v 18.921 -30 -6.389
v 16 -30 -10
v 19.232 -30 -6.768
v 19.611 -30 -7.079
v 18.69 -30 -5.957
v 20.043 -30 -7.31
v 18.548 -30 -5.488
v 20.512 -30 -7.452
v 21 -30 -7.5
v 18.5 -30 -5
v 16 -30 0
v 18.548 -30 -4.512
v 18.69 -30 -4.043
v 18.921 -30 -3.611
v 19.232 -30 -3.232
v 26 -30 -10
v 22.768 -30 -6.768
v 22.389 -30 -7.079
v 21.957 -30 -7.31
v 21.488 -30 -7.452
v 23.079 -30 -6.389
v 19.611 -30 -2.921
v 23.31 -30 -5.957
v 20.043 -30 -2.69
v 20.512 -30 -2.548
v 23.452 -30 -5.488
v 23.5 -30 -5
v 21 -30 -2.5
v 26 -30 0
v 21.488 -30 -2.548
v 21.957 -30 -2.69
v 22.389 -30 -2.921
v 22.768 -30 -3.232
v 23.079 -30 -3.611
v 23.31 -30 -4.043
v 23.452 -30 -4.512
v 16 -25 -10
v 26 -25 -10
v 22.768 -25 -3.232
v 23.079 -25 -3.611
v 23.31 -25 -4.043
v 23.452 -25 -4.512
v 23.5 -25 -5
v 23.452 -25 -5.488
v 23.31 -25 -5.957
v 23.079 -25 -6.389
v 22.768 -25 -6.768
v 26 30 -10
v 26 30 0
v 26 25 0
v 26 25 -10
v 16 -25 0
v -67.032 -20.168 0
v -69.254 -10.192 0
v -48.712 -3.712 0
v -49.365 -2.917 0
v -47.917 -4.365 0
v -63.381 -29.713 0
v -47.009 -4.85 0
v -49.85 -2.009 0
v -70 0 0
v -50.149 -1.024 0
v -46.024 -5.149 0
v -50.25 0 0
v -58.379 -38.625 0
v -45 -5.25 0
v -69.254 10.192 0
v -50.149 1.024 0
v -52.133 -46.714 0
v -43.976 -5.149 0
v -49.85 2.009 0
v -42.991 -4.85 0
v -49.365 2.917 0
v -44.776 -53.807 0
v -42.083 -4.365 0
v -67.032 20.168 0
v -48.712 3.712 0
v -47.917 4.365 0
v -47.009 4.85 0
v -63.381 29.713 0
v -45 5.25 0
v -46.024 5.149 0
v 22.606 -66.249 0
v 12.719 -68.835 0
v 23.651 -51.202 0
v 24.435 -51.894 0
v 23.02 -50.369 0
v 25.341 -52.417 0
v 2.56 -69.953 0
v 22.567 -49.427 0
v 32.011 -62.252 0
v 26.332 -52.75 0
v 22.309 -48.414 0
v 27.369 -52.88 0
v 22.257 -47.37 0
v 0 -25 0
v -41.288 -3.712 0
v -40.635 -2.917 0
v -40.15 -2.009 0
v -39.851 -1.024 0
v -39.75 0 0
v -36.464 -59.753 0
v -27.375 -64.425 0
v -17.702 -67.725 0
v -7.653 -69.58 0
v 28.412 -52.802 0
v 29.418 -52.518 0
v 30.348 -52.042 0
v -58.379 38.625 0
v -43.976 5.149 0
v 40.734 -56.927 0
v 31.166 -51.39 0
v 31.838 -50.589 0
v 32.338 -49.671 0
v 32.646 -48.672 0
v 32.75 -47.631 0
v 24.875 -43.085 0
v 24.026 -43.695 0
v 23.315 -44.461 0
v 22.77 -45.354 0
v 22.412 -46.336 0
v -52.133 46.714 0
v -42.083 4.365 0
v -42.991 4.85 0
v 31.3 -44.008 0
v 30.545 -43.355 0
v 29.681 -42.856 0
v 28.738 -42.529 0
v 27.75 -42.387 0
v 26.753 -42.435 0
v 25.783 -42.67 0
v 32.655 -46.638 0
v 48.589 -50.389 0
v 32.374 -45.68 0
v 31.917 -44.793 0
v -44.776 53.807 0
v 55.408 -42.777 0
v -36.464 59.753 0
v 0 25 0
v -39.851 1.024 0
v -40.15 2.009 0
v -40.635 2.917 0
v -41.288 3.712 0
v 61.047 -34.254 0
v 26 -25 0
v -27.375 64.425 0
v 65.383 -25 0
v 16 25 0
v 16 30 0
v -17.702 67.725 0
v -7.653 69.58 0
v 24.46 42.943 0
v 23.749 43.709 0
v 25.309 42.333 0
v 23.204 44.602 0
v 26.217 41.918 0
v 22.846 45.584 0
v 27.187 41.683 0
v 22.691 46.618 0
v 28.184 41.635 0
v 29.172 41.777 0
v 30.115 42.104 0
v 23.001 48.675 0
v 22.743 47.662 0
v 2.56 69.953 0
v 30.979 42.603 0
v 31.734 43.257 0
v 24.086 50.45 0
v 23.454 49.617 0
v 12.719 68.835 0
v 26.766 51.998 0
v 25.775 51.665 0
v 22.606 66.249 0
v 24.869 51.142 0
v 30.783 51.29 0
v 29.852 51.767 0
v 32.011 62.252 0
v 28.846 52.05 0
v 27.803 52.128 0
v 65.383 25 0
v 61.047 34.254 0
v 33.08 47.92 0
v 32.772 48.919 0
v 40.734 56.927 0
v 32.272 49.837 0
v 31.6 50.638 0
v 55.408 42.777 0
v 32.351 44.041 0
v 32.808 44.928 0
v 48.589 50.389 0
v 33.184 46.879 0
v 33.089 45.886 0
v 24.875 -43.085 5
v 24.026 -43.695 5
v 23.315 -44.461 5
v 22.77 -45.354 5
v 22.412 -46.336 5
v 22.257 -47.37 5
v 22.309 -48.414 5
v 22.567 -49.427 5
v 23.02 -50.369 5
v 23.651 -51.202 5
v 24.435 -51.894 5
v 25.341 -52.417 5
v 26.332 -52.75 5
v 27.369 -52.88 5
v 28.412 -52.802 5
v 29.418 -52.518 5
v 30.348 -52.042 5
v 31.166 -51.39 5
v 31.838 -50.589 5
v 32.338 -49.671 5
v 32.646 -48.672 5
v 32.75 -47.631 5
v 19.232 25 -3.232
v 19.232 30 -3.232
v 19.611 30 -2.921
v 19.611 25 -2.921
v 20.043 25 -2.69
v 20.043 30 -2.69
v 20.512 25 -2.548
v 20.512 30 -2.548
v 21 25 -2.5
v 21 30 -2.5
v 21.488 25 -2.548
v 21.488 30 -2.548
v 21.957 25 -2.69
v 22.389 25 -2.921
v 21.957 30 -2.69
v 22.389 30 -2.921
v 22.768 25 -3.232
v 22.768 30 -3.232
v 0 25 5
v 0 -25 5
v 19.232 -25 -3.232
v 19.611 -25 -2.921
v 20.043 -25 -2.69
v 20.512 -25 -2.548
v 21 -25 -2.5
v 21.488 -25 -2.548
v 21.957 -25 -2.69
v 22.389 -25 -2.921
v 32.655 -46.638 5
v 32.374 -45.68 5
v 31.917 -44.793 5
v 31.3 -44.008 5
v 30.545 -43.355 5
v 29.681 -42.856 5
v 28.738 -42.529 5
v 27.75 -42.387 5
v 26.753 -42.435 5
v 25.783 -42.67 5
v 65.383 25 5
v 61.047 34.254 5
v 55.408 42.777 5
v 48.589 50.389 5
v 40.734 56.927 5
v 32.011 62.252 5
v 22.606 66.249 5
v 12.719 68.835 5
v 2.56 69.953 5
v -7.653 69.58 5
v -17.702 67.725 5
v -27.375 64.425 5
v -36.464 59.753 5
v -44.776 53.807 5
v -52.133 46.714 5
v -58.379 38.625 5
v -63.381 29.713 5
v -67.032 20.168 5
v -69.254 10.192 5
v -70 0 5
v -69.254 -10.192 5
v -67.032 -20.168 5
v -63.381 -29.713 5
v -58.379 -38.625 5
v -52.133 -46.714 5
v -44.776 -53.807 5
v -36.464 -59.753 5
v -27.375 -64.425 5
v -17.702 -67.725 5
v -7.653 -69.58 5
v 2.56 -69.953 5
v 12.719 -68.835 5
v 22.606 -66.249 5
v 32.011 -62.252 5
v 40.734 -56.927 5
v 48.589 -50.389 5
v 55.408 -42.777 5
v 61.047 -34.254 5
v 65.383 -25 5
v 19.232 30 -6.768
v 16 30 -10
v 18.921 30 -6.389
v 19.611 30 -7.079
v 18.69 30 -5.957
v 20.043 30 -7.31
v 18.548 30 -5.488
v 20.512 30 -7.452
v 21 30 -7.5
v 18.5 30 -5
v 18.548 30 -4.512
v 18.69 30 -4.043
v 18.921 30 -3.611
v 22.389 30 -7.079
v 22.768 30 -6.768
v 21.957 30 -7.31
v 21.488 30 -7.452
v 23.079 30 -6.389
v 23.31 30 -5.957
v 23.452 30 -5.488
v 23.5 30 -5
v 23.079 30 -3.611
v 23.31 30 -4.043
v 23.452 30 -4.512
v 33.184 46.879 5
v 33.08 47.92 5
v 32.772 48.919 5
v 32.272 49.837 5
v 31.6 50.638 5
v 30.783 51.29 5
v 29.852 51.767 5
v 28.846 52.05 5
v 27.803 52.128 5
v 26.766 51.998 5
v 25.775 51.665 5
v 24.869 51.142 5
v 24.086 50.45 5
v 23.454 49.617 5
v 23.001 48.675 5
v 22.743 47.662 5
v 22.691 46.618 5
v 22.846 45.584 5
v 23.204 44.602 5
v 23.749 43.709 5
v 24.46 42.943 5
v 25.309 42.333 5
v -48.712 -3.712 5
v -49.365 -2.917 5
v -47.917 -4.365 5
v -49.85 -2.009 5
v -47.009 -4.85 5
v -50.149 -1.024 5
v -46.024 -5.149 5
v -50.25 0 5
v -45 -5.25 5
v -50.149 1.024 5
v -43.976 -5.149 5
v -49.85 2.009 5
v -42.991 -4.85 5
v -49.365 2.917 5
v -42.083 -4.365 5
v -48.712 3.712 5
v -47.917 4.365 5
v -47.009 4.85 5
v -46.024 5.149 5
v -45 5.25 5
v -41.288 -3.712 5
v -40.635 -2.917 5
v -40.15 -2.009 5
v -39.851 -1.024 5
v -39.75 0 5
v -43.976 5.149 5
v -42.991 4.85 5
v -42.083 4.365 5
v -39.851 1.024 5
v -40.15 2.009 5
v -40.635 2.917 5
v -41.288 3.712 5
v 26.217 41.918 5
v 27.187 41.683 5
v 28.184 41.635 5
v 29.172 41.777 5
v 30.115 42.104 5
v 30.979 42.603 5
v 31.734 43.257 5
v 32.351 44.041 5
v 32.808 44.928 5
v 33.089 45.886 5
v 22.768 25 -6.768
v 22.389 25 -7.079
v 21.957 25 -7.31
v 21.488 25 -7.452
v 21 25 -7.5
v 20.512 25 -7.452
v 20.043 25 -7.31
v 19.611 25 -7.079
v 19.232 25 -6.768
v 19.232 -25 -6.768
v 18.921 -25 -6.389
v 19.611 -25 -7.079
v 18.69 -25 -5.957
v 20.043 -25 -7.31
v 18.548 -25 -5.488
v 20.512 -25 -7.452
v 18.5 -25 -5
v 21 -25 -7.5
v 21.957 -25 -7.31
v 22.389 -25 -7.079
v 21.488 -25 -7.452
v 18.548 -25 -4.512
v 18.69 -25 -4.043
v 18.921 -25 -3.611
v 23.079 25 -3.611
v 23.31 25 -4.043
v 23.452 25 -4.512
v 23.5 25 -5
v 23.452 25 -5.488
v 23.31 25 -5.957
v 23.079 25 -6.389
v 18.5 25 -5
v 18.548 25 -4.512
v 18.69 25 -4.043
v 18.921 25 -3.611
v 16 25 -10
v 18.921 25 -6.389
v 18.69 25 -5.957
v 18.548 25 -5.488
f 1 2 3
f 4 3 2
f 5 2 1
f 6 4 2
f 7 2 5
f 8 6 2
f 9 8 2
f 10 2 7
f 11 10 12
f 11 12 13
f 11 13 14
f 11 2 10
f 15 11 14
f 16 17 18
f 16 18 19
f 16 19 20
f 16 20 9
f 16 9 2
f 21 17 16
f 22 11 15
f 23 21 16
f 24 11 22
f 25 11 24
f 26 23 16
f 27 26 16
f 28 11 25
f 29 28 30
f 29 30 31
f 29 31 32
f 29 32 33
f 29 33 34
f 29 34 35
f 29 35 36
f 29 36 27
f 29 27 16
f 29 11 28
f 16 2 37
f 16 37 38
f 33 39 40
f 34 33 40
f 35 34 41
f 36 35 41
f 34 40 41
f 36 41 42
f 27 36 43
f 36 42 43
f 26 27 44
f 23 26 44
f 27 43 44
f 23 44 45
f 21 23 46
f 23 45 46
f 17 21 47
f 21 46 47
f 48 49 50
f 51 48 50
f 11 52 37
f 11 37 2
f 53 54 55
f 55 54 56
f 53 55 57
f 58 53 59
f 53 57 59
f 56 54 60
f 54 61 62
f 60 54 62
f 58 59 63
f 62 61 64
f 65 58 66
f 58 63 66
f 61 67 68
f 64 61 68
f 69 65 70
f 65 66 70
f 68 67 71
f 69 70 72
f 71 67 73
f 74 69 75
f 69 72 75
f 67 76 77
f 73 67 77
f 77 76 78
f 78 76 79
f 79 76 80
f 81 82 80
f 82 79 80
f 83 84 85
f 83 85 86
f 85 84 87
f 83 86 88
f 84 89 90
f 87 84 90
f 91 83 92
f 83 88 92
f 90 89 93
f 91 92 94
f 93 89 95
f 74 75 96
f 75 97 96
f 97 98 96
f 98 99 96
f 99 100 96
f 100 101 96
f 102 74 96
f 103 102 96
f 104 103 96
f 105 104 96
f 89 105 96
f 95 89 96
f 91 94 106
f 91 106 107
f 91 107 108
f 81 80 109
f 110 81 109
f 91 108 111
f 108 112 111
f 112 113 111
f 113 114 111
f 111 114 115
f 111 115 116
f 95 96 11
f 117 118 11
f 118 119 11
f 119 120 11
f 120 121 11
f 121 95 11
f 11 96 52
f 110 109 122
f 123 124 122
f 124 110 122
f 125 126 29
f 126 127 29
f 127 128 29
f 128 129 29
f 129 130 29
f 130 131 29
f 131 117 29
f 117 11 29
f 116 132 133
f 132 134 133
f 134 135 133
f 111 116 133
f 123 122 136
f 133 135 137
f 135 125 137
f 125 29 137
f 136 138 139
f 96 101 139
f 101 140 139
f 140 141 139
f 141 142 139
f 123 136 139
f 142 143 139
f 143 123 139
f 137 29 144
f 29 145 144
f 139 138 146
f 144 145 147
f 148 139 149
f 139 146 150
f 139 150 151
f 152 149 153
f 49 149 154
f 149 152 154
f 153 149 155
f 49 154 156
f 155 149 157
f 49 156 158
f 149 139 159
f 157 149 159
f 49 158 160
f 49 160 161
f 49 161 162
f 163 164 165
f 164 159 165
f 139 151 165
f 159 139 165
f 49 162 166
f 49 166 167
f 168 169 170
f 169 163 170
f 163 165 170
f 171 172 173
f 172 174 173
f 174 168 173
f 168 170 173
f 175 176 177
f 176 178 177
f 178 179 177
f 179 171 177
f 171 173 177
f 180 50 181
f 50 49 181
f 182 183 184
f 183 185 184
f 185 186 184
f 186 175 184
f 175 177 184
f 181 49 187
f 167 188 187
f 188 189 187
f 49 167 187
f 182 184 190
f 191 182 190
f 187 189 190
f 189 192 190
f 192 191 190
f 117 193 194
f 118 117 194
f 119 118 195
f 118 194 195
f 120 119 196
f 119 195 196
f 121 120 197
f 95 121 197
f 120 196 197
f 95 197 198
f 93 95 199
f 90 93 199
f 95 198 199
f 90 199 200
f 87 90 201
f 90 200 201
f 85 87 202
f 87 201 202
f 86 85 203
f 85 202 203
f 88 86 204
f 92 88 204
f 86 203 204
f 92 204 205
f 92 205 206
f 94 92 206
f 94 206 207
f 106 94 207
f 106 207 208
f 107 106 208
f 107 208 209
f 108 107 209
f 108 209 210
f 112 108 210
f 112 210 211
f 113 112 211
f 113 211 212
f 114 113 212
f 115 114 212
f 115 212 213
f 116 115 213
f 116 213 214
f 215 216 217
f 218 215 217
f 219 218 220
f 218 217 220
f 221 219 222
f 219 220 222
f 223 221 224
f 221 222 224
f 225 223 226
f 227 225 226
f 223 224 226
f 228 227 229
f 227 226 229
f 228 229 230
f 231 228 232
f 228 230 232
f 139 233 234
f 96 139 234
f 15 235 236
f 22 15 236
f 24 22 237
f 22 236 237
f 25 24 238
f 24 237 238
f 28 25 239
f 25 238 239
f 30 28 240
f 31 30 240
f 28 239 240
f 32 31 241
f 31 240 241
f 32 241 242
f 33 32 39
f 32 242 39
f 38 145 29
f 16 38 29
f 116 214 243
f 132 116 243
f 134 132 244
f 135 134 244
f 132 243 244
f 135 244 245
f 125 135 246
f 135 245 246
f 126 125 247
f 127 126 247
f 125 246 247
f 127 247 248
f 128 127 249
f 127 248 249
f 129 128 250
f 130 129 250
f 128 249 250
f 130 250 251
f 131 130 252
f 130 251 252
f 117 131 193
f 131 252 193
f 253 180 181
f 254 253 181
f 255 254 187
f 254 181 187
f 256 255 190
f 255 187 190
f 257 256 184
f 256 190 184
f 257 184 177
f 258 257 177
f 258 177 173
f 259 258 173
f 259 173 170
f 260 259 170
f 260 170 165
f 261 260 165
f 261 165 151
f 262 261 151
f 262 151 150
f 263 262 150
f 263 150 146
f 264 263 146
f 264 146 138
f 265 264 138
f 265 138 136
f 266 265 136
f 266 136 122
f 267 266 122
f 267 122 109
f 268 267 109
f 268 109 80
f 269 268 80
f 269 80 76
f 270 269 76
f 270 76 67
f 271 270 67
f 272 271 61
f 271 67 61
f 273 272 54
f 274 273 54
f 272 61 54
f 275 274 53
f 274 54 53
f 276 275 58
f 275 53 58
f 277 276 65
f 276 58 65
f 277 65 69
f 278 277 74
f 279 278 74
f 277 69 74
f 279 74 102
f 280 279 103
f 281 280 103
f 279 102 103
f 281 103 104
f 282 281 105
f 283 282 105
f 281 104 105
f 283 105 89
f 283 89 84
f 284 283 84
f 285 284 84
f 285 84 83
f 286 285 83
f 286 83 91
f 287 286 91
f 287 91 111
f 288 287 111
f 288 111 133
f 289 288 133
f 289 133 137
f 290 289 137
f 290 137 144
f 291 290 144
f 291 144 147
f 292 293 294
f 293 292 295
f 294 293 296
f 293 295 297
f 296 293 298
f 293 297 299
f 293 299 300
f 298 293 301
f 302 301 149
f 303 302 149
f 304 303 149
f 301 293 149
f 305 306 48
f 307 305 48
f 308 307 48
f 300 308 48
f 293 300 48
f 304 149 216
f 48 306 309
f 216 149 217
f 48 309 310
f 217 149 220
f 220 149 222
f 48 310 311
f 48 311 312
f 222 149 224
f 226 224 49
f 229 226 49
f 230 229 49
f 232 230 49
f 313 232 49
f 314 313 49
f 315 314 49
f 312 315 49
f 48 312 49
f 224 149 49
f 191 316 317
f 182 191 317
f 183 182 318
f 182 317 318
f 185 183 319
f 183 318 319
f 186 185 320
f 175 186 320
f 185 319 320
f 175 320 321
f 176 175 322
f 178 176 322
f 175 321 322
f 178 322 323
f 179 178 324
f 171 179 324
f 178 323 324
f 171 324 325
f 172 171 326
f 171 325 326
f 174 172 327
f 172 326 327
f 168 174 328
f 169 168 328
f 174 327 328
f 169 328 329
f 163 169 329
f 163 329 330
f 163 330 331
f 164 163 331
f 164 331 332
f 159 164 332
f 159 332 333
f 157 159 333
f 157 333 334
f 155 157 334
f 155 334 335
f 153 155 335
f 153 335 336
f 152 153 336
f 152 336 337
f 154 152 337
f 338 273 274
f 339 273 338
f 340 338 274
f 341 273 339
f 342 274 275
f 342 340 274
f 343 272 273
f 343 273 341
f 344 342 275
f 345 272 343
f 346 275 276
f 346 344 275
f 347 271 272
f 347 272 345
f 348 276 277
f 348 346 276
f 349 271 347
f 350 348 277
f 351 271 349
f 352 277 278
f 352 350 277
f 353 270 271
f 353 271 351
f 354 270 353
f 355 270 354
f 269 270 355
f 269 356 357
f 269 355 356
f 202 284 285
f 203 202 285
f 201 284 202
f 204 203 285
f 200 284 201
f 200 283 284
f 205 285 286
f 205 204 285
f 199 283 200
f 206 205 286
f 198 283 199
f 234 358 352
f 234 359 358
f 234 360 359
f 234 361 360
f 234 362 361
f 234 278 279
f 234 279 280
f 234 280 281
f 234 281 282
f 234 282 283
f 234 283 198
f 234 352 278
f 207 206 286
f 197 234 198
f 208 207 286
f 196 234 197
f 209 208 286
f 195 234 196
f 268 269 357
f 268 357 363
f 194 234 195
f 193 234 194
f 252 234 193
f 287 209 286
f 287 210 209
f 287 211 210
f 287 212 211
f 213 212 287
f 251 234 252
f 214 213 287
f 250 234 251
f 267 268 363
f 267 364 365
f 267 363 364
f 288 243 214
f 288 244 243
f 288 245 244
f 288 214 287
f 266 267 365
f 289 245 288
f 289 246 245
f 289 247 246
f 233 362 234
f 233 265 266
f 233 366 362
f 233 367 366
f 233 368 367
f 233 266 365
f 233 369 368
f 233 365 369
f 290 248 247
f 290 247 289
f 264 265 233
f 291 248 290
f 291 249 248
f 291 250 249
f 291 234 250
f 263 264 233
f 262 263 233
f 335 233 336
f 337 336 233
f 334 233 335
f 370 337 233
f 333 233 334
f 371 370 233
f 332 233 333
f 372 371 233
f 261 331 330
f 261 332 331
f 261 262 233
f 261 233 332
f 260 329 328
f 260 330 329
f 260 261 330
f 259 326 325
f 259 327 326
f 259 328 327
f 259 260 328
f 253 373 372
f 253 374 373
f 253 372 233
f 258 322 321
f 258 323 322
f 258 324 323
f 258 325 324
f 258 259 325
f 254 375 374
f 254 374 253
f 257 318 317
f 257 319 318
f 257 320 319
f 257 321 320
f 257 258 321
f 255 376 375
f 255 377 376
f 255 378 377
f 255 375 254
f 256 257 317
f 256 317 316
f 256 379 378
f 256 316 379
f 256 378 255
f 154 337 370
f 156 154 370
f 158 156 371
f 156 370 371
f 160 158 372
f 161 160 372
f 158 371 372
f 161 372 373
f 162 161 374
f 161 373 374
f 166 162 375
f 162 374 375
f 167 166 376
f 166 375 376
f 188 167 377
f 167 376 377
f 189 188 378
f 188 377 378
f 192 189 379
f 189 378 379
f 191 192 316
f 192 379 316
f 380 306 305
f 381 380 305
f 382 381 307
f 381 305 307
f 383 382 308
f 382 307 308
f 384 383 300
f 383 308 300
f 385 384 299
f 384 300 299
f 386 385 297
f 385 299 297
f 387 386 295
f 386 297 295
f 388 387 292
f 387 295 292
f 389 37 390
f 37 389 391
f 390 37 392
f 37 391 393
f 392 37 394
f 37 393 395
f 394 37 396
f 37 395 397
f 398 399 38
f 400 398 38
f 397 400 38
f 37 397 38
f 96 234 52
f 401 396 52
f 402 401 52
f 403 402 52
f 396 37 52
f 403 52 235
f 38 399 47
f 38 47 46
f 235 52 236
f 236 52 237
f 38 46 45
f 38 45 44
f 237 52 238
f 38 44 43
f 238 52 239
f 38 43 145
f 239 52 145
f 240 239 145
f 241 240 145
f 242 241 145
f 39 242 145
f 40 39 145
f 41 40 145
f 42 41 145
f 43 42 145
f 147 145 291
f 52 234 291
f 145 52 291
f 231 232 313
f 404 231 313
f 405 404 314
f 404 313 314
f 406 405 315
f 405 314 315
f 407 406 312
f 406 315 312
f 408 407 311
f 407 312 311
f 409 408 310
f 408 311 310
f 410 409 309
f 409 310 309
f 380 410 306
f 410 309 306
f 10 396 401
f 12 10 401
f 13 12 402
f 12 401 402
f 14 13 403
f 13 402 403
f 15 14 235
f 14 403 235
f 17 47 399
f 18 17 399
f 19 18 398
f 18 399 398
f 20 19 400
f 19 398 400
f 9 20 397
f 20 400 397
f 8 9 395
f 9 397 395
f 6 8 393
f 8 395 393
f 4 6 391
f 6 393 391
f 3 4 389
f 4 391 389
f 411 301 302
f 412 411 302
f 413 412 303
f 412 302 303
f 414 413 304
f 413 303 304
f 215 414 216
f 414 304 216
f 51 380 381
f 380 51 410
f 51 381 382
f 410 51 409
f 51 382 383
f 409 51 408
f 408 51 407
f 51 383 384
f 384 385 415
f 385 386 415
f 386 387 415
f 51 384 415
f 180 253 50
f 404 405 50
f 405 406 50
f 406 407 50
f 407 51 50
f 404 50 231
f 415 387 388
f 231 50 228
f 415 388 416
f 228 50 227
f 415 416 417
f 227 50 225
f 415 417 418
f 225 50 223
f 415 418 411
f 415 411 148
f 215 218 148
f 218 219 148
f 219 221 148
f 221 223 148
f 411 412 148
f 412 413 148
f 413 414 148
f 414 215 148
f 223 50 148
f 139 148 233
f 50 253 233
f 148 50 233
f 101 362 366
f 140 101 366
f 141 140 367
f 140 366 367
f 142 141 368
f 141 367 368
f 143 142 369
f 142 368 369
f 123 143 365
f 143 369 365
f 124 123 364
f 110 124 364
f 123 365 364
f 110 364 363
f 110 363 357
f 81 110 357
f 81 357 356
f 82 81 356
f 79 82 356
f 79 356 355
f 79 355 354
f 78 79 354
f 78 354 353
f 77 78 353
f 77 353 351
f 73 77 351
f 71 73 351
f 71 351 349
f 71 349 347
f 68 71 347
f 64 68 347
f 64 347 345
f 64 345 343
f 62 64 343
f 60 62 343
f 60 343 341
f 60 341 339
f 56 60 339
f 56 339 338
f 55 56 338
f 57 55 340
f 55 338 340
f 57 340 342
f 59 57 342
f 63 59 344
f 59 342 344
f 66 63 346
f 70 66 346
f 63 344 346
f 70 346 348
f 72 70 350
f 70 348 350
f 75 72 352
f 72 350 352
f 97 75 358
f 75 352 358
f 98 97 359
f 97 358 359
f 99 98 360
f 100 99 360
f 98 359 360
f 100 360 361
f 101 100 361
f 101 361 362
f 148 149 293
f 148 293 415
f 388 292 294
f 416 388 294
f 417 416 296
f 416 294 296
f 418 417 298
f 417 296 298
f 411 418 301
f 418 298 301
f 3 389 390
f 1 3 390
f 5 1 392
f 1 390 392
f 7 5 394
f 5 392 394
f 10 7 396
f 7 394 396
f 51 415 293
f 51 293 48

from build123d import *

# Parameters (mm, degrees)
F0_R     = 70
F1_DEPTH = 5
F2_R     = 5.25
F3_DEPTH = 25
F5_DEPTH = 25
F6_W     = 10
F6_H     = 5
F7_DEPTH = 10
F9_DEPTH = 75.4


with BuildPart() as f1:
    # F0 (on Top) → F1 (new body)
    with BuildSketch(Plane.XY):
        Circle(F0_R)
    extrude(amount=F1_DEPTH)

    # F2 (on face) → F3 (cut)
    with BuildSketch(Plane.XY.offset(5)):
        with Locations((-45, 0)):
            Circle(F2_R)
        with BuildLine():
            ThreePointArc((33.1841421179, 46.8794410023), (25.3091421179, 51.4260743721), (25.3091421179, 42.3328076324))
            ThreePointArc((25.3091421179, 42.3328076324), (30.5591421179, 42.3328076324), (33.1841421179, 46.8794410023))
        make_face()
        with BuildLine():
            ThreePointArc((32.75, -47.6313972081), (30.125, -43.0847638383), (24.875, -43.0847638383))
            ThreePointArc((24.875, -43.0847638383), (24.875, -52.178030578), (32.75, -47.6313972081))
        make_face()
    extrude(amount=-F3_DEPTH, mode=Mode.SUBTRACT)

    # F4 (on face) → F5 (cut)
    with BuildSketch(Plane.XY.offset(5)):
        with BuildLine():
            Line((65.3834841531, 25), (0, 25))
            Line((0, 25), (0, -25))
            Line((0, -25), (65.3834841531, -25))
            ThreePointArc((65.3834841531, -25), (68.8361964766, -12.7113356749), (70, 0))
            ThreePointArc((70, 0), (68.8361964766, 12.7113356749), (65.3834841531, 25))
        make_face()
    extrude(amount=-F5_DEPTH, mode=Mode.SUBTRACT)

    # F6 (on face) → F7 (join)
    with BuildSketch(Plane(origin=(0, 0, 0), x_dir=(1, 0, 0), z_dir=(0, 0, -1))):
        with Locations((21, -27.5)):
            Rectangle(F6_W, F6_H)
        with Locations((21, 27.5)):
            Rectangle(F6_W, F6_H)
    extrude(amount=F7_DEPTH)

    # F8 (on face) → F9 (cut)
    with BuildSketch(Plane(origin=(0, 30, 0), x_dir=(-1, 0, 0), z_dir=(0, 1, 0))):
        with BuildLine():
            Line((-21, -5), (-22.767766953, -3.232233047))
            ThreePointArc((-22.767766953, -3.232233047), (-23.5, -5), (-22.767766953, -6.767766953))
            Line((-22.767766953, -6.767766953), (-21, -5))
        make_face()
        with BuildLine():
            Line((-19.232233047, -3.232233047), (-21, -5))
            Line((-21, -5), (-19.232233047, -6.767766953))
            ThreePointArc((-19.232233047, -6.767766953), (-18.6903011687, -5.9567085809), (-18.5, -5))
            ThreePointArc((-18.5, -5), (-18.6903011687, -4.0432914191), (-19.232233047, -3.232233047))
        make_face()
        with BuildLine():
            Line((-19.232233047, -6.767766953), (-21, -5))
            Line((-21, -5), (-22.767766953, -6.767766953))
            ThreePointArc((-22.767766953, -6.767766953), (-21, -7.5), (-19.232233047, -6.767766953))
        make_face()
        with BuildLine():
            ThreePointArc((-19.232233047, -3.232233047), (-21, -2.5), (-22.767766953, -3.232233047))
            Line((-22.767766953, -3.232233047), (-21, -5))
            Line((-21, -5), (-19.232233047, -3.232233047))
        make_face()
    extrude(amount=-F9_DEPTH, mode=Mode.SUBTRACT)


solid = f1.part
